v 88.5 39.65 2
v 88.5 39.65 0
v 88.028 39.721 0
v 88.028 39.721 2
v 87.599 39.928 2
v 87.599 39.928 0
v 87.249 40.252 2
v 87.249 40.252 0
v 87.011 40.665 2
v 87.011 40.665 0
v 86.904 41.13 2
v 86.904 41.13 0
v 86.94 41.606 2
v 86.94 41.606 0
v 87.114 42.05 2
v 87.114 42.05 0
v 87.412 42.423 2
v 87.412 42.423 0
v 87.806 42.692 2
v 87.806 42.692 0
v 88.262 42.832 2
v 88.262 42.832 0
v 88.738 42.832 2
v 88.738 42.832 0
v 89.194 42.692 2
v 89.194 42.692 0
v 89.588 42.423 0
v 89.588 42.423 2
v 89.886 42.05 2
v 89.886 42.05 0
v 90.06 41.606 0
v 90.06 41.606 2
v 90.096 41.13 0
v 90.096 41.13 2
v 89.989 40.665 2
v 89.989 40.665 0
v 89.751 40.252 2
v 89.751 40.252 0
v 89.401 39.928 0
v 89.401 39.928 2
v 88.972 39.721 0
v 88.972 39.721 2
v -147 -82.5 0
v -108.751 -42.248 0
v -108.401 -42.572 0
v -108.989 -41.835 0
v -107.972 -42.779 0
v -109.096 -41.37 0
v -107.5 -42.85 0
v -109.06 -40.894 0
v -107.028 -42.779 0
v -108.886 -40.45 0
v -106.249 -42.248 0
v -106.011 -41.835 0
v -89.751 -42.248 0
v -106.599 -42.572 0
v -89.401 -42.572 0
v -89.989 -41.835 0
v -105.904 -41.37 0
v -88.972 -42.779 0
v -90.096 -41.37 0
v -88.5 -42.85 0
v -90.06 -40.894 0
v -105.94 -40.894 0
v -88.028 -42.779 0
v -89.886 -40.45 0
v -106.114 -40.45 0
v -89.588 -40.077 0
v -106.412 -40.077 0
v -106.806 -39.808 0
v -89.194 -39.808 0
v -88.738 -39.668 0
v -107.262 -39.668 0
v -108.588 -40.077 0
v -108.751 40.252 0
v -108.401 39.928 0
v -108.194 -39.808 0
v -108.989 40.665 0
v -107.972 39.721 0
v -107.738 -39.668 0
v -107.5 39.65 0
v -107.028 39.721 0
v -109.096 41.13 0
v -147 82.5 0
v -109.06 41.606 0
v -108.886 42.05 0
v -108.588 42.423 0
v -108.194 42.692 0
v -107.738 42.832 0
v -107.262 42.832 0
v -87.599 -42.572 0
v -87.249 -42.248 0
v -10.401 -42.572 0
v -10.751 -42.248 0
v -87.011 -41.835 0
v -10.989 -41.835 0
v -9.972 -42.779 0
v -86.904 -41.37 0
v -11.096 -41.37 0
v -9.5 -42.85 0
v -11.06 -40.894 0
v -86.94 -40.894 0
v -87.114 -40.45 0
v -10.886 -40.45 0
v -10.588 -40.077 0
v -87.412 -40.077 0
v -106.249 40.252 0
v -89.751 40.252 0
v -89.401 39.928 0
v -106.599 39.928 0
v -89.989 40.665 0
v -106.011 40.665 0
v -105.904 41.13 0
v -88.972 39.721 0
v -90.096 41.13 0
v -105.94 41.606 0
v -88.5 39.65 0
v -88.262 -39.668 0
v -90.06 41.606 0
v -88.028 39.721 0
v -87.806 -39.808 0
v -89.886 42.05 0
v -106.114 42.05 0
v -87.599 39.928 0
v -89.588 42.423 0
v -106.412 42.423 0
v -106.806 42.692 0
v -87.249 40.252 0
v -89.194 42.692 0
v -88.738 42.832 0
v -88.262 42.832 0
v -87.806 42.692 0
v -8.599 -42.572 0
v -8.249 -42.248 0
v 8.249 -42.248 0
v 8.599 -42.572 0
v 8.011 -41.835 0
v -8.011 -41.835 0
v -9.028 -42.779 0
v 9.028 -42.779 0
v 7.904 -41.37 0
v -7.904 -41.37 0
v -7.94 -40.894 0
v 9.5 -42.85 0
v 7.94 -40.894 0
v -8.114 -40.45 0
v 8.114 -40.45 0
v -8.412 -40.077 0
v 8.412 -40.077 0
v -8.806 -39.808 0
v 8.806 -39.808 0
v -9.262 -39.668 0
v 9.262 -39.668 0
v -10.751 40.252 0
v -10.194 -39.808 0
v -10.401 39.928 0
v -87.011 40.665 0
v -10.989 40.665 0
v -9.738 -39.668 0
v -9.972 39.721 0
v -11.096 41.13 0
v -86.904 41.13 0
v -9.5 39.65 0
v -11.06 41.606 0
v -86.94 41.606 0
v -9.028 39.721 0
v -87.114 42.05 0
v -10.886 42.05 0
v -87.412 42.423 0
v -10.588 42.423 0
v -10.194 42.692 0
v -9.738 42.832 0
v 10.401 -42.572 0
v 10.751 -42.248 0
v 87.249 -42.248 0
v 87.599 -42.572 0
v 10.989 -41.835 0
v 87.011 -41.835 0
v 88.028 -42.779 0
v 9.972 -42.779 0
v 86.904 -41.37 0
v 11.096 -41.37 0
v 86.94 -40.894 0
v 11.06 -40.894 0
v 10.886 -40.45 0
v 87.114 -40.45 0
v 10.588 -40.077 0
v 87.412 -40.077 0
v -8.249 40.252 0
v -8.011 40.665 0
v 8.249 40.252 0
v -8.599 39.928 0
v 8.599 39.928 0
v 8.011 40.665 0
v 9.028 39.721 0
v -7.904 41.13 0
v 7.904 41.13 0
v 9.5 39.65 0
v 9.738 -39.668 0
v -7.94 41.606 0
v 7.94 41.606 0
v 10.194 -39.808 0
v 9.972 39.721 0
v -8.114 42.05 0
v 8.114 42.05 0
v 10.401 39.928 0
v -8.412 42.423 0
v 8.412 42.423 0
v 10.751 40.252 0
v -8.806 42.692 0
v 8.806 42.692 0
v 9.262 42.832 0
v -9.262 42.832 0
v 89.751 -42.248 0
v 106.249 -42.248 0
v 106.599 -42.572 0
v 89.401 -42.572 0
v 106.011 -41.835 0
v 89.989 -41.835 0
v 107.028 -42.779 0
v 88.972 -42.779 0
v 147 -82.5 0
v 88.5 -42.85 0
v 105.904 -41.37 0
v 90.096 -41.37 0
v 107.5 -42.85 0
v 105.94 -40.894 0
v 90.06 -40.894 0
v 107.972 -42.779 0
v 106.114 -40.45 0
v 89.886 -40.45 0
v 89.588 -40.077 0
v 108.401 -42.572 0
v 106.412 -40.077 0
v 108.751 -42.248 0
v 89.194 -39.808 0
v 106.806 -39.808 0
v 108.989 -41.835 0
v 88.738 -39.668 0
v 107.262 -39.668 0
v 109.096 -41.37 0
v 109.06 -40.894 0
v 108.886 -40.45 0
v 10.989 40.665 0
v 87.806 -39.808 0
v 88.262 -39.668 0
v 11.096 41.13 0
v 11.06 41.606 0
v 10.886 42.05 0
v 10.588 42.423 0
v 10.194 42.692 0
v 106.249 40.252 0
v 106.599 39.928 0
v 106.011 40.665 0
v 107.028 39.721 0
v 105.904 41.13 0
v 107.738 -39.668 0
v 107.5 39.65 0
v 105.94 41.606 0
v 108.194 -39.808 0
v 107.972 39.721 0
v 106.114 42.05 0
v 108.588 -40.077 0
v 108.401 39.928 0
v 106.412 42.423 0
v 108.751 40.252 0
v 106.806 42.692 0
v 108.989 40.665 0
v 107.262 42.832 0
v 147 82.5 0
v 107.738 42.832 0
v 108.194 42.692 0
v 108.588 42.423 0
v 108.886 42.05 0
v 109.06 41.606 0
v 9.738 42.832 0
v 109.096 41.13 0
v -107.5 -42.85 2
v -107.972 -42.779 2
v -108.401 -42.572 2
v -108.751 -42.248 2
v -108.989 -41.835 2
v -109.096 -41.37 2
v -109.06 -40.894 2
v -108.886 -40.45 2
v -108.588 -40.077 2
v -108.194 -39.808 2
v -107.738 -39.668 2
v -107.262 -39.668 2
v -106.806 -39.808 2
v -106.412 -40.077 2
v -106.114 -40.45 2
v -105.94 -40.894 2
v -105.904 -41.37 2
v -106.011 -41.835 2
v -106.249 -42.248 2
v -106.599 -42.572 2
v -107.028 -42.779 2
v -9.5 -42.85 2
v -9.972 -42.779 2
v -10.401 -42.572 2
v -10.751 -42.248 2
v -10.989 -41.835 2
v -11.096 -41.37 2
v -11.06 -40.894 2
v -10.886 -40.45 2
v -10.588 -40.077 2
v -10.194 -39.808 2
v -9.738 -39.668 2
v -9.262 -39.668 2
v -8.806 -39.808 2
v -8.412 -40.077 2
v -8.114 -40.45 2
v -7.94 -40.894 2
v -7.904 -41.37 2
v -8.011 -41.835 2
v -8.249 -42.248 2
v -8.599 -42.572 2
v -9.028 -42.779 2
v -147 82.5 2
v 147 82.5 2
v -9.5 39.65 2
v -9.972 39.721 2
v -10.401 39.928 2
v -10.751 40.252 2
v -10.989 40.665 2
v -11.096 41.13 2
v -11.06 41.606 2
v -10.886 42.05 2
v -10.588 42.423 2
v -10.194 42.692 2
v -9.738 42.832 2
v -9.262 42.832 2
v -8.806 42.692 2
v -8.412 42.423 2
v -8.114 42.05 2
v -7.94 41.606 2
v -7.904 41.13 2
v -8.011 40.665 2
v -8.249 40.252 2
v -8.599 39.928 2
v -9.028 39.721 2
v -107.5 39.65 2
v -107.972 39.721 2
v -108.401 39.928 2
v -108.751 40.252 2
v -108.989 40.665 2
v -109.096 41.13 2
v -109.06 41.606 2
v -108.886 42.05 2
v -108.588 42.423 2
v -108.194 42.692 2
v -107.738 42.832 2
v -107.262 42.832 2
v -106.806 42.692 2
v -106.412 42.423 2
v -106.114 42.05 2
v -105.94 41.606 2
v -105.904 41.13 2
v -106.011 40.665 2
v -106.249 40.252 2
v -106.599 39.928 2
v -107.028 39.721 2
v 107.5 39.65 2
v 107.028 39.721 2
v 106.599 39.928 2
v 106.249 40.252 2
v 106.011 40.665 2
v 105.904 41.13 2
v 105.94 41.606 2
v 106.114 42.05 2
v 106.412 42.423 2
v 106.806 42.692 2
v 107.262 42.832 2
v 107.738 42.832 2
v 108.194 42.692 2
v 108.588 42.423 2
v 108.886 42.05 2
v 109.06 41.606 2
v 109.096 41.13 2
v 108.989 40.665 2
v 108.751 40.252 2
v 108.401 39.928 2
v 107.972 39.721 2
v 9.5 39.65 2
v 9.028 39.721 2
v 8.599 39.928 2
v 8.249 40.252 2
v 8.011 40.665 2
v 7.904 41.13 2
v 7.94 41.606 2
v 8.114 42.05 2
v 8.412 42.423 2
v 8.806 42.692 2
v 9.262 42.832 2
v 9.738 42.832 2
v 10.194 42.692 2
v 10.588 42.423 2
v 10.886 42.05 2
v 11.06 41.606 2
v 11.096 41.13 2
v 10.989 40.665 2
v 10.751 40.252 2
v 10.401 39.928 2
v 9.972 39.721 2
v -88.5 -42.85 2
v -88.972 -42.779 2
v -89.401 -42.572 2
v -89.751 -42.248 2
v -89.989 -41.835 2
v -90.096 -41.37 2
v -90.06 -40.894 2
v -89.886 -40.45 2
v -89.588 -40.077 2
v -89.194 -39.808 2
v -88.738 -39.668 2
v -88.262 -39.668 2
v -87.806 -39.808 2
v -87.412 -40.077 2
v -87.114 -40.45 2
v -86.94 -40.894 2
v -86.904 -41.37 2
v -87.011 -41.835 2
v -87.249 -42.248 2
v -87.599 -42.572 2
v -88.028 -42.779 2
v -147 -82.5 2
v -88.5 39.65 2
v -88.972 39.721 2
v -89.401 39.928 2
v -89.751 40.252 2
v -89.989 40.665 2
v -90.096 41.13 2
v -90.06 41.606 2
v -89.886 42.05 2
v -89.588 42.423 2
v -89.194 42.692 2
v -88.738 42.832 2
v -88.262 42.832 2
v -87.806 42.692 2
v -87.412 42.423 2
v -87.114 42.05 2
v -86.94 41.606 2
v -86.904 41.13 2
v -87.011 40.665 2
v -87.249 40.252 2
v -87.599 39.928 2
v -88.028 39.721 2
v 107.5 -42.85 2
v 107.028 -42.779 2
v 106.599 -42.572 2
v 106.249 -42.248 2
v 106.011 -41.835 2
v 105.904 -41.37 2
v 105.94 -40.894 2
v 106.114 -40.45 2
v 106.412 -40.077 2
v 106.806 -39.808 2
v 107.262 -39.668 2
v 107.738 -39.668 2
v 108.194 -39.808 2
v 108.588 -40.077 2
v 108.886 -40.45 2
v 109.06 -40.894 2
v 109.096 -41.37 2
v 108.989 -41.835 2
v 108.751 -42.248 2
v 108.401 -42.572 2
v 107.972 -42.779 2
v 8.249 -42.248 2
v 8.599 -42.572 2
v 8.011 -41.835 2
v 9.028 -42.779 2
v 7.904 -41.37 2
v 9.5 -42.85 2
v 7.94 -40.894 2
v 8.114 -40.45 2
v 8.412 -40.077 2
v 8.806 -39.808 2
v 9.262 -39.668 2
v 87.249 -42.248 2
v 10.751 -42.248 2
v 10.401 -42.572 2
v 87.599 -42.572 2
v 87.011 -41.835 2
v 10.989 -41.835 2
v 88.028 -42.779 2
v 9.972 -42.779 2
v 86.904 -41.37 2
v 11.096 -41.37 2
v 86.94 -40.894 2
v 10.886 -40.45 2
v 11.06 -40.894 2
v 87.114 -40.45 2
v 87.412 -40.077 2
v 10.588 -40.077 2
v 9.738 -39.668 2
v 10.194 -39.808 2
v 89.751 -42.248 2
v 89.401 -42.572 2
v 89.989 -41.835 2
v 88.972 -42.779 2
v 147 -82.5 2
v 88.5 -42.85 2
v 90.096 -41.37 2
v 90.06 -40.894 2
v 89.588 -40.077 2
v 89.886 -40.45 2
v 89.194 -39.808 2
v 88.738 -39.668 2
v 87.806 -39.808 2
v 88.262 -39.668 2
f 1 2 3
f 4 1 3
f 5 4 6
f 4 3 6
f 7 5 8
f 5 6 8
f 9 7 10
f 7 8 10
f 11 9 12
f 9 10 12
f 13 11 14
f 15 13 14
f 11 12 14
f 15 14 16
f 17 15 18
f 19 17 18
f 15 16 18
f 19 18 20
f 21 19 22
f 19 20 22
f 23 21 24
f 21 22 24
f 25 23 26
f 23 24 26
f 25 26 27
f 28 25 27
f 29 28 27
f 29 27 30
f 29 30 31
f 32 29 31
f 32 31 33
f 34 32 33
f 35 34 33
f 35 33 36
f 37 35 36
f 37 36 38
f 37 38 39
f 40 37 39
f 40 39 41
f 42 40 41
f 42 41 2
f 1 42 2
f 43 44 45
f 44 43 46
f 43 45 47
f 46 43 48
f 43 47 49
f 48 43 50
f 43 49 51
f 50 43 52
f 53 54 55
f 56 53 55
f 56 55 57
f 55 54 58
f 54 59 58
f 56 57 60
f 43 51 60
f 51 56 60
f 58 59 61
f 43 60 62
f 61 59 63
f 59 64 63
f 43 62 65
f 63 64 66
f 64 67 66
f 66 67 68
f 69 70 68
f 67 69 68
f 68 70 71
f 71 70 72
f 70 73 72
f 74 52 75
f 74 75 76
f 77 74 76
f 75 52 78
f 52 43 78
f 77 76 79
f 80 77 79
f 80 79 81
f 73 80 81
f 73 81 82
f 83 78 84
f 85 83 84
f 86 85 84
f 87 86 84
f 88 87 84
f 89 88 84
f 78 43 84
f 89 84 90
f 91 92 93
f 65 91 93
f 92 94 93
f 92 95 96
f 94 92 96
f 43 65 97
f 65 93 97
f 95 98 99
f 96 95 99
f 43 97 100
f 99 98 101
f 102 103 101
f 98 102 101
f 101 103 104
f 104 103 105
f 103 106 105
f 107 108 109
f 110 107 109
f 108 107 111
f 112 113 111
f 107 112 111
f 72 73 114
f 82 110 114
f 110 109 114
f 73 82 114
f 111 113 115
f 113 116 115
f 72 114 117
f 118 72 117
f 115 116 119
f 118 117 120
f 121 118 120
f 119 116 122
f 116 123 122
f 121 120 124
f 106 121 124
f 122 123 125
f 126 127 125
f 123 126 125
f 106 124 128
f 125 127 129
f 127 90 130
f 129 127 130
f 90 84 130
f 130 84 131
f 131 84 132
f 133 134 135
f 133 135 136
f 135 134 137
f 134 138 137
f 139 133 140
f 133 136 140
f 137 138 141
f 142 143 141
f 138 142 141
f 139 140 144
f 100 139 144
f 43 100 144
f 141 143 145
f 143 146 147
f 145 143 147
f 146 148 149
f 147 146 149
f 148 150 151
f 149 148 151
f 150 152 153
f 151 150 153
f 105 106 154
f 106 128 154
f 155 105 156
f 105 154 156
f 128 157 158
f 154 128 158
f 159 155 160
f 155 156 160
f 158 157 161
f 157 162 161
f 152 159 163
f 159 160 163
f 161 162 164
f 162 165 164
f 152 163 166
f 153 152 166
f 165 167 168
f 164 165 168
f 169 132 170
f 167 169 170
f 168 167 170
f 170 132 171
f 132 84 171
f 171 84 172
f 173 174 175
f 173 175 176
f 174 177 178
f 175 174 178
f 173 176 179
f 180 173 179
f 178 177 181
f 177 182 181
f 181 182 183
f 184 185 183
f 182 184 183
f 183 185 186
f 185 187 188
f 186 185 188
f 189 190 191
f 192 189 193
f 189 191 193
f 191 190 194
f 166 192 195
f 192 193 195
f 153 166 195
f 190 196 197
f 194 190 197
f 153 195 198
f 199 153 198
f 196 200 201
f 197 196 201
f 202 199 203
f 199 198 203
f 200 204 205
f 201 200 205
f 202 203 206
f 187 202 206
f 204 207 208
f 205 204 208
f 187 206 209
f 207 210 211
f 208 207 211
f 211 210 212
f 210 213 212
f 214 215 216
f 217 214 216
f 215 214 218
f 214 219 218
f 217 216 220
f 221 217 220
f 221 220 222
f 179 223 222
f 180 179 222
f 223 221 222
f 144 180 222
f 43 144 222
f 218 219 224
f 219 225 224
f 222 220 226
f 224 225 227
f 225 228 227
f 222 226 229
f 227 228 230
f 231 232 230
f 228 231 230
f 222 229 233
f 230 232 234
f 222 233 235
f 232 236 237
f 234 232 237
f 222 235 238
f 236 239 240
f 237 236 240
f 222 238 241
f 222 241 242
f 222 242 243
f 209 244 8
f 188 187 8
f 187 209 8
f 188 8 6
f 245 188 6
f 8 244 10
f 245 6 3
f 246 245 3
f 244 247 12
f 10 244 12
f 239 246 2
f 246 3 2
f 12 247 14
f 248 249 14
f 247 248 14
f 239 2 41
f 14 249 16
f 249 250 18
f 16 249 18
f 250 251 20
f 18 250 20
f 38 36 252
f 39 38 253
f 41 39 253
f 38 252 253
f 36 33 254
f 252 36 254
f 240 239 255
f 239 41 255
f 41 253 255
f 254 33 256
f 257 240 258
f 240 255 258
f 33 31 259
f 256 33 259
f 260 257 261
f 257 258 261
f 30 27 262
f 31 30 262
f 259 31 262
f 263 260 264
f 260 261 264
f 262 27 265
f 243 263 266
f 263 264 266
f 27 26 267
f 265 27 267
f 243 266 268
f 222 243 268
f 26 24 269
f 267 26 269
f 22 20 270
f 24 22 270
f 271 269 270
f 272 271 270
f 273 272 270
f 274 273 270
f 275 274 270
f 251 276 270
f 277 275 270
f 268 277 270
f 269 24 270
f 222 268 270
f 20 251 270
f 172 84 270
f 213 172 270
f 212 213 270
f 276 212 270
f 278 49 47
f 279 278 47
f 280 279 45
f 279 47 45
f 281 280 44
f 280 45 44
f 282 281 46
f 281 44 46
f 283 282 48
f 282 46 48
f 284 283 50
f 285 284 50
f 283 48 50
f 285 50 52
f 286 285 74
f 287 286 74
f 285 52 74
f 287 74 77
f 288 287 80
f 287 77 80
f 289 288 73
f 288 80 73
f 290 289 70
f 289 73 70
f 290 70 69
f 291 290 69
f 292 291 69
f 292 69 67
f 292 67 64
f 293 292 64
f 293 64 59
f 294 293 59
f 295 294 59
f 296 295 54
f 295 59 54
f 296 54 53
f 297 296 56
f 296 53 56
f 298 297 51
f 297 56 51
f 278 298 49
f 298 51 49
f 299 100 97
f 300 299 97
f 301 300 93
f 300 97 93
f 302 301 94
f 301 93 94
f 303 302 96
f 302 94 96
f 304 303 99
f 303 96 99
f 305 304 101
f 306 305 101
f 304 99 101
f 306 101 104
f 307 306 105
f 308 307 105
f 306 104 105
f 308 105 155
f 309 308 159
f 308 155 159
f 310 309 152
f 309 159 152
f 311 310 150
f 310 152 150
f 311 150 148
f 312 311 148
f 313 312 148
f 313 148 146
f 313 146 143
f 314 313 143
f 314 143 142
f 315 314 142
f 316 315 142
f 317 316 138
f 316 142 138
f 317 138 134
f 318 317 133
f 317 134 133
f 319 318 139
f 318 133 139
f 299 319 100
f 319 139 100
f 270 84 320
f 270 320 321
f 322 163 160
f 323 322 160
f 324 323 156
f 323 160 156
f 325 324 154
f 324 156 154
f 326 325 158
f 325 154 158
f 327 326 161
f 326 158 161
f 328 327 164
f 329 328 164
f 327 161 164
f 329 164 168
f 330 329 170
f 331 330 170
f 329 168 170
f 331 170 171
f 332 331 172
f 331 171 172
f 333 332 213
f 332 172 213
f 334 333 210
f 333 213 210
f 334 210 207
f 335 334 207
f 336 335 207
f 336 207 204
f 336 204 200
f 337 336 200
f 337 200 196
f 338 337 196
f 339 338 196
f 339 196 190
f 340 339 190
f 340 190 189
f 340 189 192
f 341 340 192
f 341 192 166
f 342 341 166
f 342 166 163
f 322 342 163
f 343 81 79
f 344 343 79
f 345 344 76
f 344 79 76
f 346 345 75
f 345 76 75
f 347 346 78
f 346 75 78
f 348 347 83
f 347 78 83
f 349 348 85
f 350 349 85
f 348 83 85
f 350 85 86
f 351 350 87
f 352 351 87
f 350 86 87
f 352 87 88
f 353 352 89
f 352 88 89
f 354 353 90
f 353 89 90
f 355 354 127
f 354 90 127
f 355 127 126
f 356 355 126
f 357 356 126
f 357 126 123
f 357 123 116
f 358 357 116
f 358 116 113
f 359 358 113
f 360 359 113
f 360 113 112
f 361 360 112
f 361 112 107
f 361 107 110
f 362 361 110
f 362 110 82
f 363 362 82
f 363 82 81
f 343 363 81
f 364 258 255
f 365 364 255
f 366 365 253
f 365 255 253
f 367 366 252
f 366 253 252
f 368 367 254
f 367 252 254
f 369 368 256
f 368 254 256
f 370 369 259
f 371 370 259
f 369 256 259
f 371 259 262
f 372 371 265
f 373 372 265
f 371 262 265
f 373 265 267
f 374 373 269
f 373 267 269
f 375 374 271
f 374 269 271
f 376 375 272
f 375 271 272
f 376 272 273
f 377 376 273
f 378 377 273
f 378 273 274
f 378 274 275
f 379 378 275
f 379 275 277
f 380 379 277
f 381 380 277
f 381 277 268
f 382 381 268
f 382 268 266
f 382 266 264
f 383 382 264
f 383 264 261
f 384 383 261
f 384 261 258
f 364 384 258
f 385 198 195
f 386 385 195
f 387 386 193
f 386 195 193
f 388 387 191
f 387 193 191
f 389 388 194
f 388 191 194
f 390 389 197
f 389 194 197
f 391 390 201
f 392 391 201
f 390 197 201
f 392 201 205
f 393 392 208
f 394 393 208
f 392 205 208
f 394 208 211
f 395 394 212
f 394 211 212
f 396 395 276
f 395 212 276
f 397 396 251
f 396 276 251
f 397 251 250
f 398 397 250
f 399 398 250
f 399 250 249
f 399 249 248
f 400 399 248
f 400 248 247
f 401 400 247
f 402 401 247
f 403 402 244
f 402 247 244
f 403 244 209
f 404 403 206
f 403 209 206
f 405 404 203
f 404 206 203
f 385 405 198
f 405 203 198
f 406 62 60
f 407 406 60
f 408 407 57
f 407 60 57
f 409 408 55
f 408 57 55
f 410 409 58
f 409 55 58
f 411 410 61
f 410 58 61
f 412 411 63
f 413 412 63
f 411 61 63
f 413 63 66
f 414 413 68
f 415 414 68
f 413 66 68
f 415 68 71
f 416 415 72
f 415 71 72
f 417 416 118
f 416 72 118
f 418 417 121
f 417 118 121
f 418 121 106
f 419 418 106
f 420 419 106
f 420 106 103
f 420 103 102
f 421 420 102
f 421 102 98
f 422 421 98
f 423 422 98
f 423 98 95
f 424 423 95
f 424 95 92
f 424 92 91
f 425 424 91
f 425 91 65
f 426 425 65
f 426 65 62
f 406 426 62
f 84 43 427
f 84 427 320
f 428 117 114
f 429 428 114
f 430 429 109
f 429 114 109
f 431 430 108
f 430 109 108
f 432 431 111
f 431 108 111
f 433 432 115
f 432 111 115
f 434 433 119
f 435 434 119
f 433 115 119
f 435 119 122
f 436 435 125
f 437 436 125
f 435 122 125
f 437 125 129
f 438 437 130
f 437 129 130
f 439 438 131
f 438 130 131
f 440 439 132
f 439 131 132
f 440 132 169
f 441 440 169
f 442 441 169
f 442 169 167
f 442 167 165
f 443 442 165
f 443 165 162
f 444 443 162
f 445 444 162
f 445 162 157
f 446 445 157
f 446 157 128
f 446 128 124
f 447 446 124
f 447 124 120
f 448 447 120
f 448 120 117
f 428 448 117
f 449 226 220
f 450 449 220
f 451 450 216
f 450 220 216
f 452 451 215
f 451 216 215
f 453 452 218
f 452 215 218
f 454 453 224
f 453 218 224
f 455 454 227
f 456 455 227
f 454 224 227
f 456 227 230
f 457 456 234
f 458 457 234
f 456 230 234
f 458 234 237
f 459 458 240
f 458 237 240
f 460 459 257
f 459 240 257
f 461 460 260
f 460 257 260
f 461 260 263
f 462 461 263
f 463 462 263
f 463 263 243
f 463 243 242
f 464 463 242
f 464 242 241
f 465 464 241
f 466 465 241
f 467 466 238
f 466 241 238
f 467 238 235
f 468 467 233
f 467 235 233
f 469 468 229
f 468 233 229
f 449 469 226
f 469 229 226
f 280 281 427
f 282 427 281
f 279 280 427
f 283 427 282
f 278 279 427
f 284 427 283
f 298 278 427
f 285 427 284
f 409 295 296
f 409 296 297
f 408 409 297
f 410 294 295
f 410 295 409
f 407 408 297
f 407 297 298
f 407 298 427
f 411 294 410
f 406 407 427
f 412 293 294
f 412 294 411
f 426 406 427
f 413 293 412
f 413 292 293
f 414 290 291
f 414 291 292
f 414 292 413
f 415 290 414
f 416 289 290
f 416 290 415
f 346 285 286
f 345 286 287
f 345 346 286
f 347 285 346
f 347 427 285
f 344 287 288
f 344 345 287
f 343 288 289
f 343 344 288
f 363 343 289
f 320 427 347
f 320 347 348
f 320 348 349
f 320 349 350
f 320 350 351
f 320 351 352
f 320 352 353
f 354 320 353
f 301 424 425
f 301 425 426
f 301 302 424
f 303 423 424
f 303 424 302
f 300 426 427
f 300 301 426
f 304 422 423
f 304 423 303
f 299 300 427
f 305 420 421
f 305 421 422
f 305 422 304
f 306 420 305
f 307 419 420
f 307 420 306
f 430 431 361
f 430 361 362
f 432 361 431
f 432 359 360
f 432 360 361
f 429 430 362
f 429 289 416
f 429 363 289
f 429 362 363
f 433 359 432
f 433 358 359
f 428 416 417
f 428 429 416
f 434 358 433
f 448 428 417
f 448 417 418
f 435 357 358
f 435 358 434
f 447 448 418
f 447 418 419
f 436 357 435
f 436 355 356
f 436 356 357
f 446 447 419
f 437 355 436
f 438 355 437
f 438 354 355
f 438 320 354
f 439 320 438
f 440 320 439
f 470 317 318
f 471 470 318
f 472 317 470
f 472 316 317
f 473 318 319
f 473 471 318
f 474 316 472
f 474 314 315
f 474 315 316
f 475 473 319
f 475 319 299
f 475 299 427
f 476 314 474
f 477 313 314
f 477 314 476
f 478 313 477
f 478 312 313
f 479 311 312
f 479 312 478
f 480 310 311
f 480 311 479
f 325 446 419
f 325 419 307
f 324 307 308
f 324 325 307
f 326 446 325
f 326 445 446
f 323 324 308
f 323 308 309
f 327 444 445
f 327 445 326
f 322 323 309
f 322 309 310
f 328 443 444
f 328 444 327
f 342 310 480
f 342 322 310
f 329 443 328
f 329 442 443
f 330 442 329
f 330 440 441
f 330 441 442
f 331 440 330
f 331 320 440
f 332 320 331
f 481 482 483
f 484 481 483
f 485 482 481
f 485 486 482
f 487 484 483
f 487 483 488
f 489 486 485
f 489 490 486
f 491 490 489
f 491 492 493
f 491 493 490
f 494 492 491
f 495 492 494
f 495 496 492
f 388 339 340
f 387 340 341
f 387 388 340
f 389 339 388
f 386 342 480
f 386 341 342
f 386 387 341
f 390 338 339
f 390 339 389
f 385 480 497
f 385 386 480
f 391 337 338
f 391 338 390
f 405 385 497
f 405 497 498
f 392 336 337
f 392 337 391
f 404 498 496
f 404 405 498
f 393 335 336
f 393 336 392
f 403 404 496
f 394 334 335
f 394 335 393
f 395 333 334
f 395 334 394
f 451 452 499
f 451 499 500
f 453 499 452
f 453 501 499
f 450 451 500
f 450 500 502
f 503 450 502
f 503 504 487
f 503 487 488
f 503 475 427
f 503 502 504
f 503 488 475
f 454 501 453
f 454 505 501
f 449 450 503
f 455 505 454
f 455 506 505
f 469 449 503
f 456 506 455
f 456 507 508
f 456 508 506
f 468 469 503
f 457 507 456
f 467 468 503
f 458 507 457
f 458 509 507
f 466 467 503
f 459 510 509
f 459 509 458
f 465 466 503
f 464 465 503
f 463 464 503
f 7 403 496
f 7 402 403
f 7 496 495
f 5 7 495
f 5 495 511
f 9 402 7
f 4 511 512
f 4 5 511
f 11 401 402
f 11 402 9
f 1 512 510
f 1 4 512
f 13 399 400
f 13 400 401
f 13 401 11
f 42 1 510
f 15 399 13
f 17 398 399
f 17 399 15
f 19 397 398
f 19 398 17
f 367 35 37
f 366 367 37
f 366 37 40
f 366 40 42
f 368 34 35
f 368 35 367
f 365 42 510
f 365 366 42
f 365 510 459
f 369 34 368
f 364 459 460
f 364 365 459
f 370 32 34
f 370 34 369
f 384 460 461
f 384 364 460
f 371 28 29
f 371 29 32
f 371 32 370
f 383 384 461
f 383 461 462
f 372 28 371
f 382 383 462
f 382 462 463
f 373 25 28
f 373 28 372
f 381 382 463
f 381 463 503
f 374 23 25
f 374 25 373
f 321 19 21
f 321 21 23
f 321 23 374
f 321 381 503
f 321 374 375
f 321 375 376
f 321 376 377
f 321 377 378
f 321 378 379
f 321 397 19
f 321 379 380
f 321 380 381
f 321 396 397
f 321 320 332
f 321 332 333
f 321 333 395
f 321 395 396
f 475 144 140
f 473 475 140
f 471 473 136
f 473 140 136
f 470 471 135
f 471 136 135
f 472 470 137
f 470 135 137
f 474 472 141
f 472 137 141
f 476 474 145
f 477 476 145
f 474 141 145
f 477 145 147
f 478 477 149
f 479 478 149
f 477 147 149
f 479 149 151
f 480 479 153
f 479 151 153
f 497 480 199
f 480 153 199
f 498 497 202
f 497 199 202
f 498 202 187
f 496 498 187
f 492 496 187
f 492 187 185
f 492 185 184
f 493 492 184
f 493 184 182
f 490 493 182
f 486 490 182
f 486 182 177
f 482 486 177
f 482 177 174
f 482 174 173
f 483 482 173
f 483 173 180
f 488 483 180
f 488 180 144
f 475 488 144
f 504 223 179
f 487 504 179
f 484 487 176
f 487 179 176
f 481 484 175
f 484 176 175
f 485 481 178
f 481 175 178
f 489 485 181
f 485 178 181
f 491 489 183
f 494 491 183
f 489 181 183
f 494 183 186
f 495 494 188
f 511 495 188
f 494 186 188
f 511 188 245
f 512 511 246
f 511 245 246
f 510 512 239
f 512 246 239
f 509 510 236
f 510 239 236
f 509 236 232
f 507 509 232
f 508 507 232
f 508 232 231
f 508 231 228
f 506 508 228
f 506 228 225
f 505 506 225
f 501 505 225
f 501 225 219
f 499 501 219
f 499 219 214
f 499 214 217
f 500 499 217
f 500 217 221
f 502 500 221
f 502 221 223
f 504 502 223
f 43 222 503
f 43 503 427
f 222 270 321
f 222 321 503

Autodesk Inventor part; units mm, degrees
ref_plane "YZ Plane" through (0, 0, 0) normal (1, 0, 0) x (0, 1, 0)
ref_plane "XZ Plane" through (0, 0, 0) normal (0, 1, 0) x (-1, 0, 0)
ref_plane "XY Plane" through (0, 0, 0) normal (0, 0, 1) x (1, 0, 0)
sketch "スケッチ1" plane through (0, 0, 0) normal (0, 0, 1) x (1, 0, 0)
  line L0 (-147, 82.5) -> (147, 82.5)
  line L1 (147, 82.5) -> (147, -82.5)
  line L2 (147, -82.5) -> (-147, -82.5)
  line L3 (-147, -82.5) -> (-147, 82.5)
  point P0 (0, 0)
  dimension "d0" = 294
  dimension "d1" = 165
  dimension "d2" = 147
  dimension "d3" = 82.5
extrude "押し出し1" add sketch "スケッチ1" along normal blind 2
sketch "スケッチ2" plane through (0, 0, 2) normal (0, 0, 1) x (1, 0, 0)
  line L0 (147, 82.5) -> (147, -82.5) projected
  line L1 (-147, 82.5) -> (147, 82.5) projected
  line L2 (-147, -82.5) -> (-147, 82.5) projected
  line L3 (147, -82.5) -> (-147, -82.5) projected
  line L4 (-147, -82.5) -> (-147, 82.5) projected
  line L5 (-147, 0) -> (147, 0)
  line L6 (-147, 41.25) -> (147, 41.25)
  line L7 (147, -41.25) -> (-147, -41.25)
  line L8 (0, 82.5) -> (0, -82.5)
  line L9 (-98, 82.5) -> (-98, -82.5)
  line L10 (98, 82.5) -> (98, -82.5)
  point P0 (0, 0)
  point P1 (-107.5, 41.25)
  point P2 (-88.5, 41.25)
  point P3 (-9.5, 41.25)
  point P4 (9.5, 41.25)
  point P5 (88.5, 41.25)
  point P6 (107.5, 41.25)
  point P7 (107.5, -41.25)
  point P8 (88.5, -41.25)
  point P9 (9.5, -41.25)
  point P10 (-9.5, -41.25)
  point P11 (-88.5, -41.25)
  point P12 (-107.5, -41.25)
  dimension "d6" = 41.25
  dimension "d7" = 41.25
  dimension "d8" = 98
  dimension "d9" = 98
  dimension "d22" = 19
  dimension "d23" = 9.5
  dimension "d24" = 19
  dimension "d25" = 9.5
  dimension "d26" = 19
  dimension "d27" = 9.5
  dimension "d28" = 19
  dimension "d29" = 9.5
  dimension "d30" = 19
  dimension "d31" = 9.5
  dimension "d32" = 19
  dimension "d33" = 9.5
hole "Hole1" at (-107.5, 41.25, 2) at (-88.5, 41.25, 2) at (-9.5, 41.25, 2) at (9.5, 41.25, 2) at (88.5, 41.25, 2) at (107.5, 41.25, 2) at (107.5, -41.25, 2) at (88.5, -41.25, 2) at (9.5, -41.25, 2) at (-9.5, -41.25, 2) at (-88.5, -41.25, 2) at (-107.5, -41.25, 2) direction (0, 0, -1) diameter 3.2 end through all
equation "\"d2\" = 0.5 * d0"
equation "\"d3\" = 0.5 * d1"
equation "\"d7\" = d6"
equation "\"d9\" = d8"
equation "\"d23\" = 0.5 * d22"
equation "\"d24\" = d22"
equation "\"d25\" = d23"
equation "\"d26\" = d22"
equation "\"d27\" = d23"
equation "\"d28\" = d22"
equation "\"d29\" = d23"
equation "\"d30\" = d22"
equation "\"d31\" = d23"
equation "\"d32\" = d22"
equation "\"d33\" = d23"
properties part number "huta"
